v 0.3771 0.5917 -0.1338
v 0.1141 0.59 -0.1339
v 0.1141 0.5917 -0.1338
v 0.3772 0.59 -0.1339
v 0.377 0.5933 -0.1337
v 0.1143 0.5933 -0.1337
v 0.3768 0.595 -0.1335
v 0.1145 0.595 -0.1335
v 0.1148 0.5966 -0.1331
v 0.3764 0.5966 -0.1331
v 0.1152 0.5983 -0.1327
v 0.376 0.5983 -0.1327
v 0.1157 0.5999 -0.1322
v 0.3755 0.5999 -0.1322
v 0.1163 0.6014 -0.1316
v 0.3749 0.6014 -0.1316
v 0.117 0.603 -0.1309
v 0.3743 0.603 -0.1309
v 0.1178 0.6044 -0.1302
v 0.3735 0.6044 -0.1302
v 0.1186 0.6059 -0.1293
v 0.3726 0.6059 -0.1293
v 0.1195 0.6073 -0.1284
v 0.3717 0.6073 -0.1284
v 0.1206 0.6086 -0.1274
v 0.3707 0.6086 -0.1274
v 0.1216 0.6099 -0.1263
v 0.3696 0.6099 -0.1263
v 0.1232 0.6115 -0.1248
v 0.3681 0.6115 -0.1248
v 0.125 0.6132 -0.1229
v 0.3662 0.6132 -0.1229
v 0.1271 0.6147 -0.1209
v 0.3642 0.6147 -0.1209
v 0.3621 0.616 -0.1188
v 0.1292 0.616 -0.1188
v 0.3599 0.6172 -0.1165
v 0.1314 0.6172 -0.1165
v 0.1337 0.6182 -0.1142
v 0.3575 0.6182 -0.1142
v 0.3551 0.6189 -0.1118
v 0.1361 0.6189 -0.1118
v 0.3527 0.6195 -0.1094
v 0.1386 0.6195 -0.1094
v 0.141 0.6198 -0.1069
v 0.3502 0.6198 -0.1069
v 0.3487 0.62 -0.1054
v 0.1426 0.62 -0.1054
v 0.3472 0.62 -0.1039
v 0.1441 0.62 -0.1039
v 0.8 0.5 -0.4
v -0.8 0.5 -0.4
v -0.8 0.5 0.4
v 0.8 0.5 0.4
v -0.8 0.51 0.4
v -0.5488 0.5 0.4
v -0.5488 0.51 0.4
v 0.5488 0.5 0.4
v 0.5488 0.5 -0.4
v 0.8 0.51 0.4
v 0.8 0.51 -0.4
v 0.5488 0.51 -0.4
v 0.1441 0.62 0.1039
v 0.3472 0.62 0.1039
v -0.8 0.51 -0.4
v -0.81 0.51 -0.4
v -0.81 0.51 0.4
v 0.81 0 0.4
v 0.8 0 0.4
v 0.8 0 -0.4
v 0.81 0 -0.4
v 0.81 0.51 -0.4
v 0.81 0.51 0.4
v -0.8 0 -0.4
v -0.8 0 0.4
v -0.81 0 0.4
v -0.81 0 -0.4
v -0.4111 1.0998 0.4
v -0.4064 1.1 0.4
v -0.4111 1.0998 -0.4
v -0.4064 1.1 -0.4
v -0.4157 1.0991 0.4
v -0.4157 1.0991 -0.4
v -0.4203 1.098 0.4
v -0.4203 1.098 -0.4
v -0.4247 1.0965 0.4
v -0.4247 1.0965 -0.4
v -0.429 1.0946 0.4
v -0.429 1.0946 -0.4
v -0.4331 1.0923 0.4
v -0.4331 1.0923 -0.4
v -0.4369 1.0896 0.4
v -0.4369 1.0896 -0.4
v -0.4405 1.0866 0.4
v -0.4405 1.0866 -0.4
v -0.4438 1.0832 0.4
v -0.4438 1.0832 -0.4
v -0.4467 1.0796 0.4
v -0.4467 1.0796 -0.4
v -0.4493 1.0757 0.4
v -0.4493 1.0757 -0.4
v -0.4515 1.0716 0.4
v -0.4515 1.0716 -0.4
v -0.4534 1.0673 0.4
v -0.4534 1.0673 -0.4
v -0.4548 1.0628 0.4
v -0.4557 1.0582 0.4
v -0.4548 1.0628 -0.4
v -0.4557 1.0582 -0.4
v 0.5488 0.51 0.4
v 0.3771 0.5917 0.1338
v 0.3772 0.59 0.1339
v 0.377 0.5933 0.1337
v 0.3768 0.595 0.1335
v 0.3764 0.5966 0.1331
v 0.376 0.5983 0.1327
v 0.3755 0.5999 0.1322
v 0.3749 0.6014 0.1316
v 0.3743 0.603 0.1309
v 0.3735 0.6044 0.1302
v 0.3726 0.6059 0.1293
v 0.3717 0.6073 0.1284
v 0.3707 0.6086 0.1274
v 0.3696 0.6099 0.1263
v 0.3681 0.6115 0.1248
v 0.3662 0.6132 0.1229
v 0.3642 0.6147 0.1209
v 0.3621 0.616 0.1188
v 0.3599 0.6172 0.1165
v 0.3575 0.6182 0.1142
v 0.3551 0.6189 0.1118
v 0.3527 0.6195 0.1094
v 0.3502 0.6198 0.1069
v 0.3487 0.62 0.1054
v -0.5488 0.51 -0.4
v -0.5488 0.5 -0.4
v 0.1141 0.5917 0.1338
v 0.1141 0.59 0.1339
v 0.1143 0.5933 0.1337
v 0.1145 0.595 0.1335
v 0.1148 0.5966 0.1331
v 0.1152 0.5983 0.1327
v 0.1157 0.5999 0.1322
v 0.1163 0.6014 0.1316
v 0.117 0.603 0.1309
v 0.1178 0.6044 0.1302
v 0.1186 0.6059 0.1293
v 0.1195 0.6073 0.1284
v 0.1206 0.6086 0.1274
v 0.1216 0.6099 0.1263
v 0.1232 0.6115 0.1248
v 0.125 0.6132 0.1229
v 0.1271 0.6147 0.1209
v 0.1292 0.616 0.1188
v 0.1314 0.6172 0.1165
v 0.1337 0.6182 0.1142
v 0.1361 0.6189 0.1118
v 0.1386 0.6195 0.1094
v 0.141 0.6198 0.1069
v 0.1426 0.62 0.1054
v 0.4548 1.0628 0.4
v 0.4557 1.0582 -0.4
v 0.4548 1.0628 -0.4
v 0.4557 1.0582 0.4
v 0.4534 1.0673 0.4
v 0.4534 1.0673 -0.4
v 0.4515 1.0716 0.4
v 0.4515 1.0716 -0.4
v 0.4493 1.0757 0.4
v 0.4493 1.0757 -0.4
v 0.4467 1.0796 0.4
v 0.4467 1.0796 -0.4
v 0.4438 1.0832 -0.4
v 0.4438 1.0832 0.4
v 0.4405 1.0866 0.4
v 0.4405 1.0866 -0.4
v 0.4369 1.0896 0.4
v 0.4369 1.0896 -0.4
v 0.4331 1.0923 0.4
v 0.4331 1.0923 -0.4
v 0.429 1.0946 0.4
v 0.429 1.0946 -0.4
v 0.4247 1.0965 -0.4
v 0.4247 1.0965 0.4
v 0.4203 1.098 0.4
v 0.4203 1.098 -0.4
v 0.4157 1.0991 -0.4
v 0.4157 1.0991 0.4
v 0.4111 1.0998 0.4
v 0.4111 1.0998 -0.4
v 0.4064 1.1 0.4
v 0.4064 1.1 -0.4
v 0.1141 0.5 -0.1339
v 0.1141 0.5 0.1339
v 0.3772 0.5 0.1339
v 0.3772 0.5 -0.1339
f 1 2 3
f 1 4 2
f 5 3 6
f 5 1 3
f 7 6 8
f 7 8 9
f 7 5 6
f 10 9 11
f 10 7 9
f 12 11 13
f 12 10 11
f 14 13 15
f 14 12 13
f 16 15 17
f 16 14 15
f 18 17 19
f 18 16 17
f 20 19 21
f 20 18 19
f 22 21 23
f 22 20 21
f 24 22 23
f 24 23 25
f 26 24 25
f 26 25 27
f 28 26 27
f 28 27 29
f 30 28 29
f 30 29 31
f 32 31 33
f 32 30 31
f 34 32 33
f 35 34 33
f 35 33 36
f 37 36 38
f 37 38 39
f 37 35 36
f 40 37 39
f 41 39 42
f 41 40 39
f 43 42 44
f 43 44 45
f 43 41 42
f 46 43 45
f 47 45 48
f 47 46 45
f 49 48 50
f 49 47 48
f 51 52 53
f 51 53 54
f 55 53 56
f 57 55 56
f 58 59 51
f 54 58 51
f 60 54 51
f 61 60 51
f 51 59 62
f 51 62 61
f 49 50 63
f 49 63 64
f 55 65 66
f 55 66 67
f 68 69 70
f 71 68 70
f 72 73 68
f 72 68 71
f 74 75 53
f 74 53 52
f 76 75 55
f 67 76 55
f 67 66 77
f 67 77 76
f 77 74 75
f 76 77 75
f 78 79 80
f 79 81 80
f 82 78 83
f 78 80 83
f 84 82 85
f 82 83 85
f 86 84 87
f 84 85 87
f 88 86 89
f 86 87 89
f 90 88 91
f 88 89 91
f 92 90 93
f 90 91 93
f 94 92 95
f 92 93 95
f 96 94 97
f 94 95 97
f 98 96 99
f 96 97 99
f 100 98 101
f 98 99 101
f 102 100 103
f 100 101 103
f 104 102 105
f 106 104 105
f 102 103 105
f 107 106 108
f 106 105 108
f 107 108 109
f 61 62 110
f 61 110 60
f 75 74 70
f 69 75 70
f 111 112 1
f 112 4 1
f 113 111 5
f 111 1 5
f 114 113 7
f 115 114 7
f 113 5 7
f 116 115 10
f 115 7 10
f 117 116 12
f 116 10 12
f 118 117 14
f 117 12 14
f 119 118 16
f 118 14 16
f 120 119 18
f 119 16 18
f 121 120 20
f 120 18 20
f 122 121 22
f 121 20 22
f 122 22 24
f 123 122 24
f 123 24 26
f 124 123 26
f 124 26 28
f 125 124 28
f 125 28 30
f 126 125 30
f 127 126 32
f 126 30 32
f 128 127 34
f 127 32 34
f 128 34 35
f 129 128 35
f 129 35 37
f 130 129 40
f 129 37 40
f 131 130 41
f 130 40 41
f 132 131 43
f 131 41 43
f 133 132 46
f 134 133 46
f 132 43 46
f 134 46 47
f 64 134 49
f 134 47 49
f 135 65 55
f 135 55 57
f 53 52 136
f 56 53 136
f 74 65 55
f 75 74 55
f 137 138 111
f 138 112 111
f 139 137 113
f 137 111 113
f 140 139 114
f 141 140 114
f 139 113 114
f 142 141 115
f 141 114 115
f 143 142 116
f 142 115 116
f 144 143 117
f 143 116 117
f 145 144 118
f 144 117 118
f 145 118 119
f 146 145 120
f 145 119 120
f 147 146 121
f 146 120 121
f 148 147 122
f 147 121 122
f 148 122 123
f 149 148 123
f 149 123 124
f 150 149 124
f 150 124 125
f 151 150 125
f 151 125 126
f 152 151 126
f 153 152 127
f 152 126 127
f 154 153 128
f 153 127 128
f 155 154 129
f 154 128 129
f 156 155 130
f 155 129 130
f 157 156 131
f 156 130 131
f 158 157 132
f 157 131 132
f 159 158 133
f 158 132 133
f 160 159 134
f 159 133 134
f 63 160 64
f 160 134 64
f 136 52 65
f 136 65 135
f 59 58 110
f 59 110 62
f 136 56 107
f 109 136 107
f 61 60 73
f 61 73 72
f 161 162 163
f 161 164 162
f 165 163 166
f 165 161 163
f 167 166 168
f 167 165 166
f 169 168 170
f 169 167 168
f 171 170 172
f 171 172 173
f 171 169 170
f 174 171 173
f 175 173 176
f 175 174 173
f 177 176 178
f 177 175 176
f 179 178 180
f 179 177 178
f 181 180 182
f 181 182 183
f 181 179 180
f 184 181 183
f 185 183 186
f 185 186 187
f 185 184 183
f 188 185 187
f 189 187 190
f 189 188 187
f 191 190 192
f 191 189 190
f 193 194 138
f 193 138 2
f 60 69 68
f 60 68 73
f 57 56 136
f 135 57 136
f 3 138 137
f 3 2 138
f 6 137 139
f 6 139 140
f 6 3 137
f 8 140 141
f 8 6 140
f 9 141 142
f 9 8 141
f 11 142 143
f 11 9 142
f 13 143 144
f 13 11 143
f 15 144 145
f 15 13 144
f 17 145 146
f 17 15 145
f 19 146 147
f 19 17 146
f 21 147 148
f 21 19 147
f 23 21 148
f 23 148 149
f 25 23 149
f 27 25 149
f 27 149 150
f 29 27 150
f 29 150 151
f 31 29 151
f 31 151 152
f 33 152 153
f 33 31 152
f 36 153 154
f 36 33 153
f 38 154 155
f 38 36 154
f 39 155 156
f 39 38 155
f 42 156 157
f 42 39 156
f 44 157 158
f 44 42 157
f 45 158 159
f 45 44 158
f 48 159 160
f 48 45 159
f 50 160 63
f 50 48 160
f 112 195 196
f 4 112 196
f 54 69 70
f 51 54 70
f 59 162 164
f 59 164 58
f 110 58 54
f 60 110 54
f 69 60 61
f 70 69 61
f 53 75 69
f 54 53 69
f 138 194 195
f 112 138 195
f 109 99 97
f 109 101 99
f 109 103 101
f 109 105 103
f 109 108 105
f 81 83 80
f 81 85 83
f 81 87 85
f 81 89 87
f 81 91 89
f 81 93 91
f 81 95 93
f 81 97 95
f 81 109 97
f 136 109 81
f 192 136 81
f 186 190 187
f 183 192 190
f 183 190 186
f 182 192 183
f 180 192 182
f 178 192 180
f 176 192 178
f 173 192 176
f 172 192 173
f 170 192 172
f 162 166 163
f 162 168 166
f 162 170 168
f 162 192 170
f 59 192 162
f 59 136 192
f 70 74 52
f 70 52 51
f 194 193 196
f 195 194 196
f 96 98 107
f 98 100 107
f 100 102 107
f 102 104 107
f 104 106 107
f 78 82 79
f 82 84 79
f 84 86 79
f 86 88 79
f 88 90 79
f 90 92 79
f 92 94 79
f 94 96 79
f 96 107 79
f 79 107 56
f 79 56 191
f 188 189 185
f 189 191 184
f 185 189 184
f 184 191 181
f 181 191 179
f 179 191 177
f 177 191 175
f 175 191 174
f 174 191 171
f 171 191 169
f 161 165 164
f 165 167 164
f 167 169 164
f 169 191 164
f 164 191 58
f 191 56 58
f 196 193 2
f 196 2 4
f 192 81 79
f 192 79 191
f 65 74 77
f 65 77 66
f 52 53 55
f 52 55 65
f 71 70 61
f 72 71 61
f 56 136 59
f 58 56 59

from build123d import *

# Parameters (mm, degrees)
SZKIC2_W                      = 1.6
SZKIC2_H                      = 0.8
DODANIE_WYCI_GNI_CIE1_DEPTH   = 0.5
SZKIC6_W                      = 1.097570152
SZKIC6_H                      = 0.8
DODANIE_WYCI_GNI_CIE4_DEPTH   = 0.6
SZKIC7_W                      = 0.263125241
SZKIC7_H                      = 0.267740406
DODANIE_WYCI_GNI_CIE5_DEPTH   = 0.12
SFAZOWANIE3_SIZE              = 0.6
SFAZOWANIE3_SIZE_2            = 0.1
SFAZOWANIE4_SIZE              = 0.1
SFAZOWANIE4_SIZE_2            = 0.6
ZAOKR_GLENIE3_R               = 0.05
ZAOKR_GLENIE4_R               = 0.05
SZKIC8_W                      = 0.251214924
SZKIC8_H                      = 0.8
DODANIE_WYCI_GNI_CIE6_DEPTH   = 0.01
DODANIE_WYCI_GNI_CIE6_2_DEPTH = 0.01
SZKIC9_W                      = 0.8
SZKIC9_H                      = 0.51
DODANIE_WYCI_GNI_CIE7_DEPTH   = 0.01
SZKIC10_W                     = 0.8
SZKIC10_H                     = 0.51
DODANIE_WYCI_GNI_CIE8_DEPTH   = 0.01
ZAOKR_GLENIE5_R               = 0.03


with BuildPart() as part:
    # Szkic2 → Dodanie-wyciągnięcie1 (new body)
    with BuildSketch(Plane(origin=(0, 0, 0), x_dir=(1, 0, 0), z_dir=(0, 1, 0))):
        Rectangle(SZKIC2_W, SZKIC2_H)
    extrude(amount=DODANIE_WYCI_GNI_CIE1_DEPTH)


with BuildPart() as body_2:
    # Szkic6 → Dodanie-wyciągnięcie4 (new body)
    with BuildSketch(Plane(origin=(0, 0.5, 0), x_dir=(1, 0, 0), z_dir=(0, 1, 0))):
        Rectangle(SZKIC6_W, SZKIC6_H)
    extrude(amount=DODANIE_WYCI_GNI_CIE4_DEPTH)

    # Sfazowanie3
    # the kernel refuses this chamfer: 0.6, 0.1 mm, written as the material it takes off along each edge
    with BuildSketch(Plane(origin=(-0.548785076, 1.1, 1.959214836), x_dir=(-0.0063262220237778315, -0.9999799892572381, 0), z_dir=(0, 0, -1))) as sfazowanie3_piece_1:
        Polygon((SFAZOWANIE3_SIZE * 0.999979989257, -SFAZOWANIE3_SIZE * 0.00632622202378), (-SFAZOWANIE3_SIZE_2 * 0.00632622202378, -SFAZOWANIE3_SIZE_2 * 0.999979989257), (0, 0), align=None)
    extrude(amount=3.918429673, mode=Mode.SUBTRACT)

    # Sfazowanie4
    # the kernel refuses this chamfer: 0.6, 0.1 mm, written as the material it takes off along each edge
    with BuildSketch(Plane(origin=(0.548785076, 1.1, -1.959214836), x_dir=(-0.9750324932942596, 0.2220622368174737, 0), z_dir=(0, 0, 1))) as sfazowanie4_piece_1:
        Polygon((SFAZOWANIE4_SIZE * 0.975032493294, SFAZOWANIE4_SIZE * 0.222062236817), (-SFAZOWANIE4_SIZE_2 * 0.222062236817, SFAZOWANIE4_SIZE_2 * 0.975032493294), (0, 0), align=None)
    extrude(amount=3.918429673, mode=Mode.SUBTRACT)

    # Zaokrąglenie3
    zaokr_glenie3_edges = [body_2.edges().sort_by_distance(p)[0] for p in [
        (0.448785076, 1.1, 0),
    ]]
    fillet(zaokr_glenie3_edges, radius=ZAOKR_GLENIE3_R)

    # Zaokrąglenie4
    zaokr_glenie4_edges = [body_2.edges().sort_by_distance(p)[0] for p in [
        (-0.448785076, 1.1, 0),
    ]]
    fillet(zaokr_glenie4_edges, radius=ZAOKR_GLENIE4_R)


with BuildPart() as body_3:
    # Szkic7 → Dodanie-wyciągnięcie5 (new body)
    with BuildSketch(Plane(origin=(0, 0.5, 0), x_dir=(1, 0, 0), z_dir=(0, 1, 0))):
        with Locations((0.245631468, 0)):
            Rectangle(SZKIC7_W, SZKIC7_H)
    extrude(amount=DODANIE_WYCI_GNI_CIE5_DEPTH)

    # Zaokrąglenie5
    zaokr_glenie5_edges = [body_3.edges().sort_by_distance(p)[0] for p in [
        (0.114068847, 0.62, 0),
        (0.245631467, 0.62, 0.133870203),
        (0.377194088, 0.62, 0),
        (0.245631467, 0.62, -0.133870203),
    ]]
    fillet(zaokr_glenie5_edges, radius=ZAOKR_GLENIE5_R)


with BuildPart() as body_4:
    # Szkic8 → Dodanie-wyciągnięcie6 (new body)
    with BuildSketch(Plane(origin=(0, 0.5, 0), x_dir=(1, 0, 0), z_dir=(0, 1, 0))):
        with Locations((-0.674392538, 0)):
            Rectangle(SZKIC8_W, SZKIC8_H)
    extrude(amount=DODANIE_WYCI_GNI_CIE6_DEPTH)


with BuildPart() as body_5:
    # Szkic8 → Dodanie-wyci_gni_cie6 2 (new body)
    with BuildSketch(Plane(origin=(0, 0.5, 0), x_dir=(1, 0, 0), z_dir=(0, 1, 0))):
        with Locations((0.674392538, 0)):
            Rectangle(SZKIC8_W, SZKIC8_H)
    extrude(amount=DODANIE_WYCI_GNI_CIE6_2_DEPTH)


with BuildPart() as body_6:
    # Szkic9 → Dodanie-wyciągnięcie7 (new body)
    with BuildSketch(Plane.ZY.offset(0.8)):
        with Locations((0, 0.255)):
            Rectangle(SZKIC9_W, SZKIC9_H)
    extrude(amount=DODANIE_WYCI_GNI_CIE7_DEPTH)


with BuildPart() as body_7:
    # Szkic10 → Dodanie-wyciągnięcie8 (new body)
    with BuildSketch(Plane(origin=(0.8, 0, 0), x_dir=(0, 0, -1), z_dir=(1, 0, 0))):
        with Locations((0, 0.255)):
            Rectangle(SZKIC10_W, SZKIC10_H)
    extrude(amount=DODANIE_WYCI_GNI_CIE8_DEPTH)


solid = Compound([part.part, body_2.part, body_3.part, body_4.part, body_5.part, body_6.part, body_7.part])
